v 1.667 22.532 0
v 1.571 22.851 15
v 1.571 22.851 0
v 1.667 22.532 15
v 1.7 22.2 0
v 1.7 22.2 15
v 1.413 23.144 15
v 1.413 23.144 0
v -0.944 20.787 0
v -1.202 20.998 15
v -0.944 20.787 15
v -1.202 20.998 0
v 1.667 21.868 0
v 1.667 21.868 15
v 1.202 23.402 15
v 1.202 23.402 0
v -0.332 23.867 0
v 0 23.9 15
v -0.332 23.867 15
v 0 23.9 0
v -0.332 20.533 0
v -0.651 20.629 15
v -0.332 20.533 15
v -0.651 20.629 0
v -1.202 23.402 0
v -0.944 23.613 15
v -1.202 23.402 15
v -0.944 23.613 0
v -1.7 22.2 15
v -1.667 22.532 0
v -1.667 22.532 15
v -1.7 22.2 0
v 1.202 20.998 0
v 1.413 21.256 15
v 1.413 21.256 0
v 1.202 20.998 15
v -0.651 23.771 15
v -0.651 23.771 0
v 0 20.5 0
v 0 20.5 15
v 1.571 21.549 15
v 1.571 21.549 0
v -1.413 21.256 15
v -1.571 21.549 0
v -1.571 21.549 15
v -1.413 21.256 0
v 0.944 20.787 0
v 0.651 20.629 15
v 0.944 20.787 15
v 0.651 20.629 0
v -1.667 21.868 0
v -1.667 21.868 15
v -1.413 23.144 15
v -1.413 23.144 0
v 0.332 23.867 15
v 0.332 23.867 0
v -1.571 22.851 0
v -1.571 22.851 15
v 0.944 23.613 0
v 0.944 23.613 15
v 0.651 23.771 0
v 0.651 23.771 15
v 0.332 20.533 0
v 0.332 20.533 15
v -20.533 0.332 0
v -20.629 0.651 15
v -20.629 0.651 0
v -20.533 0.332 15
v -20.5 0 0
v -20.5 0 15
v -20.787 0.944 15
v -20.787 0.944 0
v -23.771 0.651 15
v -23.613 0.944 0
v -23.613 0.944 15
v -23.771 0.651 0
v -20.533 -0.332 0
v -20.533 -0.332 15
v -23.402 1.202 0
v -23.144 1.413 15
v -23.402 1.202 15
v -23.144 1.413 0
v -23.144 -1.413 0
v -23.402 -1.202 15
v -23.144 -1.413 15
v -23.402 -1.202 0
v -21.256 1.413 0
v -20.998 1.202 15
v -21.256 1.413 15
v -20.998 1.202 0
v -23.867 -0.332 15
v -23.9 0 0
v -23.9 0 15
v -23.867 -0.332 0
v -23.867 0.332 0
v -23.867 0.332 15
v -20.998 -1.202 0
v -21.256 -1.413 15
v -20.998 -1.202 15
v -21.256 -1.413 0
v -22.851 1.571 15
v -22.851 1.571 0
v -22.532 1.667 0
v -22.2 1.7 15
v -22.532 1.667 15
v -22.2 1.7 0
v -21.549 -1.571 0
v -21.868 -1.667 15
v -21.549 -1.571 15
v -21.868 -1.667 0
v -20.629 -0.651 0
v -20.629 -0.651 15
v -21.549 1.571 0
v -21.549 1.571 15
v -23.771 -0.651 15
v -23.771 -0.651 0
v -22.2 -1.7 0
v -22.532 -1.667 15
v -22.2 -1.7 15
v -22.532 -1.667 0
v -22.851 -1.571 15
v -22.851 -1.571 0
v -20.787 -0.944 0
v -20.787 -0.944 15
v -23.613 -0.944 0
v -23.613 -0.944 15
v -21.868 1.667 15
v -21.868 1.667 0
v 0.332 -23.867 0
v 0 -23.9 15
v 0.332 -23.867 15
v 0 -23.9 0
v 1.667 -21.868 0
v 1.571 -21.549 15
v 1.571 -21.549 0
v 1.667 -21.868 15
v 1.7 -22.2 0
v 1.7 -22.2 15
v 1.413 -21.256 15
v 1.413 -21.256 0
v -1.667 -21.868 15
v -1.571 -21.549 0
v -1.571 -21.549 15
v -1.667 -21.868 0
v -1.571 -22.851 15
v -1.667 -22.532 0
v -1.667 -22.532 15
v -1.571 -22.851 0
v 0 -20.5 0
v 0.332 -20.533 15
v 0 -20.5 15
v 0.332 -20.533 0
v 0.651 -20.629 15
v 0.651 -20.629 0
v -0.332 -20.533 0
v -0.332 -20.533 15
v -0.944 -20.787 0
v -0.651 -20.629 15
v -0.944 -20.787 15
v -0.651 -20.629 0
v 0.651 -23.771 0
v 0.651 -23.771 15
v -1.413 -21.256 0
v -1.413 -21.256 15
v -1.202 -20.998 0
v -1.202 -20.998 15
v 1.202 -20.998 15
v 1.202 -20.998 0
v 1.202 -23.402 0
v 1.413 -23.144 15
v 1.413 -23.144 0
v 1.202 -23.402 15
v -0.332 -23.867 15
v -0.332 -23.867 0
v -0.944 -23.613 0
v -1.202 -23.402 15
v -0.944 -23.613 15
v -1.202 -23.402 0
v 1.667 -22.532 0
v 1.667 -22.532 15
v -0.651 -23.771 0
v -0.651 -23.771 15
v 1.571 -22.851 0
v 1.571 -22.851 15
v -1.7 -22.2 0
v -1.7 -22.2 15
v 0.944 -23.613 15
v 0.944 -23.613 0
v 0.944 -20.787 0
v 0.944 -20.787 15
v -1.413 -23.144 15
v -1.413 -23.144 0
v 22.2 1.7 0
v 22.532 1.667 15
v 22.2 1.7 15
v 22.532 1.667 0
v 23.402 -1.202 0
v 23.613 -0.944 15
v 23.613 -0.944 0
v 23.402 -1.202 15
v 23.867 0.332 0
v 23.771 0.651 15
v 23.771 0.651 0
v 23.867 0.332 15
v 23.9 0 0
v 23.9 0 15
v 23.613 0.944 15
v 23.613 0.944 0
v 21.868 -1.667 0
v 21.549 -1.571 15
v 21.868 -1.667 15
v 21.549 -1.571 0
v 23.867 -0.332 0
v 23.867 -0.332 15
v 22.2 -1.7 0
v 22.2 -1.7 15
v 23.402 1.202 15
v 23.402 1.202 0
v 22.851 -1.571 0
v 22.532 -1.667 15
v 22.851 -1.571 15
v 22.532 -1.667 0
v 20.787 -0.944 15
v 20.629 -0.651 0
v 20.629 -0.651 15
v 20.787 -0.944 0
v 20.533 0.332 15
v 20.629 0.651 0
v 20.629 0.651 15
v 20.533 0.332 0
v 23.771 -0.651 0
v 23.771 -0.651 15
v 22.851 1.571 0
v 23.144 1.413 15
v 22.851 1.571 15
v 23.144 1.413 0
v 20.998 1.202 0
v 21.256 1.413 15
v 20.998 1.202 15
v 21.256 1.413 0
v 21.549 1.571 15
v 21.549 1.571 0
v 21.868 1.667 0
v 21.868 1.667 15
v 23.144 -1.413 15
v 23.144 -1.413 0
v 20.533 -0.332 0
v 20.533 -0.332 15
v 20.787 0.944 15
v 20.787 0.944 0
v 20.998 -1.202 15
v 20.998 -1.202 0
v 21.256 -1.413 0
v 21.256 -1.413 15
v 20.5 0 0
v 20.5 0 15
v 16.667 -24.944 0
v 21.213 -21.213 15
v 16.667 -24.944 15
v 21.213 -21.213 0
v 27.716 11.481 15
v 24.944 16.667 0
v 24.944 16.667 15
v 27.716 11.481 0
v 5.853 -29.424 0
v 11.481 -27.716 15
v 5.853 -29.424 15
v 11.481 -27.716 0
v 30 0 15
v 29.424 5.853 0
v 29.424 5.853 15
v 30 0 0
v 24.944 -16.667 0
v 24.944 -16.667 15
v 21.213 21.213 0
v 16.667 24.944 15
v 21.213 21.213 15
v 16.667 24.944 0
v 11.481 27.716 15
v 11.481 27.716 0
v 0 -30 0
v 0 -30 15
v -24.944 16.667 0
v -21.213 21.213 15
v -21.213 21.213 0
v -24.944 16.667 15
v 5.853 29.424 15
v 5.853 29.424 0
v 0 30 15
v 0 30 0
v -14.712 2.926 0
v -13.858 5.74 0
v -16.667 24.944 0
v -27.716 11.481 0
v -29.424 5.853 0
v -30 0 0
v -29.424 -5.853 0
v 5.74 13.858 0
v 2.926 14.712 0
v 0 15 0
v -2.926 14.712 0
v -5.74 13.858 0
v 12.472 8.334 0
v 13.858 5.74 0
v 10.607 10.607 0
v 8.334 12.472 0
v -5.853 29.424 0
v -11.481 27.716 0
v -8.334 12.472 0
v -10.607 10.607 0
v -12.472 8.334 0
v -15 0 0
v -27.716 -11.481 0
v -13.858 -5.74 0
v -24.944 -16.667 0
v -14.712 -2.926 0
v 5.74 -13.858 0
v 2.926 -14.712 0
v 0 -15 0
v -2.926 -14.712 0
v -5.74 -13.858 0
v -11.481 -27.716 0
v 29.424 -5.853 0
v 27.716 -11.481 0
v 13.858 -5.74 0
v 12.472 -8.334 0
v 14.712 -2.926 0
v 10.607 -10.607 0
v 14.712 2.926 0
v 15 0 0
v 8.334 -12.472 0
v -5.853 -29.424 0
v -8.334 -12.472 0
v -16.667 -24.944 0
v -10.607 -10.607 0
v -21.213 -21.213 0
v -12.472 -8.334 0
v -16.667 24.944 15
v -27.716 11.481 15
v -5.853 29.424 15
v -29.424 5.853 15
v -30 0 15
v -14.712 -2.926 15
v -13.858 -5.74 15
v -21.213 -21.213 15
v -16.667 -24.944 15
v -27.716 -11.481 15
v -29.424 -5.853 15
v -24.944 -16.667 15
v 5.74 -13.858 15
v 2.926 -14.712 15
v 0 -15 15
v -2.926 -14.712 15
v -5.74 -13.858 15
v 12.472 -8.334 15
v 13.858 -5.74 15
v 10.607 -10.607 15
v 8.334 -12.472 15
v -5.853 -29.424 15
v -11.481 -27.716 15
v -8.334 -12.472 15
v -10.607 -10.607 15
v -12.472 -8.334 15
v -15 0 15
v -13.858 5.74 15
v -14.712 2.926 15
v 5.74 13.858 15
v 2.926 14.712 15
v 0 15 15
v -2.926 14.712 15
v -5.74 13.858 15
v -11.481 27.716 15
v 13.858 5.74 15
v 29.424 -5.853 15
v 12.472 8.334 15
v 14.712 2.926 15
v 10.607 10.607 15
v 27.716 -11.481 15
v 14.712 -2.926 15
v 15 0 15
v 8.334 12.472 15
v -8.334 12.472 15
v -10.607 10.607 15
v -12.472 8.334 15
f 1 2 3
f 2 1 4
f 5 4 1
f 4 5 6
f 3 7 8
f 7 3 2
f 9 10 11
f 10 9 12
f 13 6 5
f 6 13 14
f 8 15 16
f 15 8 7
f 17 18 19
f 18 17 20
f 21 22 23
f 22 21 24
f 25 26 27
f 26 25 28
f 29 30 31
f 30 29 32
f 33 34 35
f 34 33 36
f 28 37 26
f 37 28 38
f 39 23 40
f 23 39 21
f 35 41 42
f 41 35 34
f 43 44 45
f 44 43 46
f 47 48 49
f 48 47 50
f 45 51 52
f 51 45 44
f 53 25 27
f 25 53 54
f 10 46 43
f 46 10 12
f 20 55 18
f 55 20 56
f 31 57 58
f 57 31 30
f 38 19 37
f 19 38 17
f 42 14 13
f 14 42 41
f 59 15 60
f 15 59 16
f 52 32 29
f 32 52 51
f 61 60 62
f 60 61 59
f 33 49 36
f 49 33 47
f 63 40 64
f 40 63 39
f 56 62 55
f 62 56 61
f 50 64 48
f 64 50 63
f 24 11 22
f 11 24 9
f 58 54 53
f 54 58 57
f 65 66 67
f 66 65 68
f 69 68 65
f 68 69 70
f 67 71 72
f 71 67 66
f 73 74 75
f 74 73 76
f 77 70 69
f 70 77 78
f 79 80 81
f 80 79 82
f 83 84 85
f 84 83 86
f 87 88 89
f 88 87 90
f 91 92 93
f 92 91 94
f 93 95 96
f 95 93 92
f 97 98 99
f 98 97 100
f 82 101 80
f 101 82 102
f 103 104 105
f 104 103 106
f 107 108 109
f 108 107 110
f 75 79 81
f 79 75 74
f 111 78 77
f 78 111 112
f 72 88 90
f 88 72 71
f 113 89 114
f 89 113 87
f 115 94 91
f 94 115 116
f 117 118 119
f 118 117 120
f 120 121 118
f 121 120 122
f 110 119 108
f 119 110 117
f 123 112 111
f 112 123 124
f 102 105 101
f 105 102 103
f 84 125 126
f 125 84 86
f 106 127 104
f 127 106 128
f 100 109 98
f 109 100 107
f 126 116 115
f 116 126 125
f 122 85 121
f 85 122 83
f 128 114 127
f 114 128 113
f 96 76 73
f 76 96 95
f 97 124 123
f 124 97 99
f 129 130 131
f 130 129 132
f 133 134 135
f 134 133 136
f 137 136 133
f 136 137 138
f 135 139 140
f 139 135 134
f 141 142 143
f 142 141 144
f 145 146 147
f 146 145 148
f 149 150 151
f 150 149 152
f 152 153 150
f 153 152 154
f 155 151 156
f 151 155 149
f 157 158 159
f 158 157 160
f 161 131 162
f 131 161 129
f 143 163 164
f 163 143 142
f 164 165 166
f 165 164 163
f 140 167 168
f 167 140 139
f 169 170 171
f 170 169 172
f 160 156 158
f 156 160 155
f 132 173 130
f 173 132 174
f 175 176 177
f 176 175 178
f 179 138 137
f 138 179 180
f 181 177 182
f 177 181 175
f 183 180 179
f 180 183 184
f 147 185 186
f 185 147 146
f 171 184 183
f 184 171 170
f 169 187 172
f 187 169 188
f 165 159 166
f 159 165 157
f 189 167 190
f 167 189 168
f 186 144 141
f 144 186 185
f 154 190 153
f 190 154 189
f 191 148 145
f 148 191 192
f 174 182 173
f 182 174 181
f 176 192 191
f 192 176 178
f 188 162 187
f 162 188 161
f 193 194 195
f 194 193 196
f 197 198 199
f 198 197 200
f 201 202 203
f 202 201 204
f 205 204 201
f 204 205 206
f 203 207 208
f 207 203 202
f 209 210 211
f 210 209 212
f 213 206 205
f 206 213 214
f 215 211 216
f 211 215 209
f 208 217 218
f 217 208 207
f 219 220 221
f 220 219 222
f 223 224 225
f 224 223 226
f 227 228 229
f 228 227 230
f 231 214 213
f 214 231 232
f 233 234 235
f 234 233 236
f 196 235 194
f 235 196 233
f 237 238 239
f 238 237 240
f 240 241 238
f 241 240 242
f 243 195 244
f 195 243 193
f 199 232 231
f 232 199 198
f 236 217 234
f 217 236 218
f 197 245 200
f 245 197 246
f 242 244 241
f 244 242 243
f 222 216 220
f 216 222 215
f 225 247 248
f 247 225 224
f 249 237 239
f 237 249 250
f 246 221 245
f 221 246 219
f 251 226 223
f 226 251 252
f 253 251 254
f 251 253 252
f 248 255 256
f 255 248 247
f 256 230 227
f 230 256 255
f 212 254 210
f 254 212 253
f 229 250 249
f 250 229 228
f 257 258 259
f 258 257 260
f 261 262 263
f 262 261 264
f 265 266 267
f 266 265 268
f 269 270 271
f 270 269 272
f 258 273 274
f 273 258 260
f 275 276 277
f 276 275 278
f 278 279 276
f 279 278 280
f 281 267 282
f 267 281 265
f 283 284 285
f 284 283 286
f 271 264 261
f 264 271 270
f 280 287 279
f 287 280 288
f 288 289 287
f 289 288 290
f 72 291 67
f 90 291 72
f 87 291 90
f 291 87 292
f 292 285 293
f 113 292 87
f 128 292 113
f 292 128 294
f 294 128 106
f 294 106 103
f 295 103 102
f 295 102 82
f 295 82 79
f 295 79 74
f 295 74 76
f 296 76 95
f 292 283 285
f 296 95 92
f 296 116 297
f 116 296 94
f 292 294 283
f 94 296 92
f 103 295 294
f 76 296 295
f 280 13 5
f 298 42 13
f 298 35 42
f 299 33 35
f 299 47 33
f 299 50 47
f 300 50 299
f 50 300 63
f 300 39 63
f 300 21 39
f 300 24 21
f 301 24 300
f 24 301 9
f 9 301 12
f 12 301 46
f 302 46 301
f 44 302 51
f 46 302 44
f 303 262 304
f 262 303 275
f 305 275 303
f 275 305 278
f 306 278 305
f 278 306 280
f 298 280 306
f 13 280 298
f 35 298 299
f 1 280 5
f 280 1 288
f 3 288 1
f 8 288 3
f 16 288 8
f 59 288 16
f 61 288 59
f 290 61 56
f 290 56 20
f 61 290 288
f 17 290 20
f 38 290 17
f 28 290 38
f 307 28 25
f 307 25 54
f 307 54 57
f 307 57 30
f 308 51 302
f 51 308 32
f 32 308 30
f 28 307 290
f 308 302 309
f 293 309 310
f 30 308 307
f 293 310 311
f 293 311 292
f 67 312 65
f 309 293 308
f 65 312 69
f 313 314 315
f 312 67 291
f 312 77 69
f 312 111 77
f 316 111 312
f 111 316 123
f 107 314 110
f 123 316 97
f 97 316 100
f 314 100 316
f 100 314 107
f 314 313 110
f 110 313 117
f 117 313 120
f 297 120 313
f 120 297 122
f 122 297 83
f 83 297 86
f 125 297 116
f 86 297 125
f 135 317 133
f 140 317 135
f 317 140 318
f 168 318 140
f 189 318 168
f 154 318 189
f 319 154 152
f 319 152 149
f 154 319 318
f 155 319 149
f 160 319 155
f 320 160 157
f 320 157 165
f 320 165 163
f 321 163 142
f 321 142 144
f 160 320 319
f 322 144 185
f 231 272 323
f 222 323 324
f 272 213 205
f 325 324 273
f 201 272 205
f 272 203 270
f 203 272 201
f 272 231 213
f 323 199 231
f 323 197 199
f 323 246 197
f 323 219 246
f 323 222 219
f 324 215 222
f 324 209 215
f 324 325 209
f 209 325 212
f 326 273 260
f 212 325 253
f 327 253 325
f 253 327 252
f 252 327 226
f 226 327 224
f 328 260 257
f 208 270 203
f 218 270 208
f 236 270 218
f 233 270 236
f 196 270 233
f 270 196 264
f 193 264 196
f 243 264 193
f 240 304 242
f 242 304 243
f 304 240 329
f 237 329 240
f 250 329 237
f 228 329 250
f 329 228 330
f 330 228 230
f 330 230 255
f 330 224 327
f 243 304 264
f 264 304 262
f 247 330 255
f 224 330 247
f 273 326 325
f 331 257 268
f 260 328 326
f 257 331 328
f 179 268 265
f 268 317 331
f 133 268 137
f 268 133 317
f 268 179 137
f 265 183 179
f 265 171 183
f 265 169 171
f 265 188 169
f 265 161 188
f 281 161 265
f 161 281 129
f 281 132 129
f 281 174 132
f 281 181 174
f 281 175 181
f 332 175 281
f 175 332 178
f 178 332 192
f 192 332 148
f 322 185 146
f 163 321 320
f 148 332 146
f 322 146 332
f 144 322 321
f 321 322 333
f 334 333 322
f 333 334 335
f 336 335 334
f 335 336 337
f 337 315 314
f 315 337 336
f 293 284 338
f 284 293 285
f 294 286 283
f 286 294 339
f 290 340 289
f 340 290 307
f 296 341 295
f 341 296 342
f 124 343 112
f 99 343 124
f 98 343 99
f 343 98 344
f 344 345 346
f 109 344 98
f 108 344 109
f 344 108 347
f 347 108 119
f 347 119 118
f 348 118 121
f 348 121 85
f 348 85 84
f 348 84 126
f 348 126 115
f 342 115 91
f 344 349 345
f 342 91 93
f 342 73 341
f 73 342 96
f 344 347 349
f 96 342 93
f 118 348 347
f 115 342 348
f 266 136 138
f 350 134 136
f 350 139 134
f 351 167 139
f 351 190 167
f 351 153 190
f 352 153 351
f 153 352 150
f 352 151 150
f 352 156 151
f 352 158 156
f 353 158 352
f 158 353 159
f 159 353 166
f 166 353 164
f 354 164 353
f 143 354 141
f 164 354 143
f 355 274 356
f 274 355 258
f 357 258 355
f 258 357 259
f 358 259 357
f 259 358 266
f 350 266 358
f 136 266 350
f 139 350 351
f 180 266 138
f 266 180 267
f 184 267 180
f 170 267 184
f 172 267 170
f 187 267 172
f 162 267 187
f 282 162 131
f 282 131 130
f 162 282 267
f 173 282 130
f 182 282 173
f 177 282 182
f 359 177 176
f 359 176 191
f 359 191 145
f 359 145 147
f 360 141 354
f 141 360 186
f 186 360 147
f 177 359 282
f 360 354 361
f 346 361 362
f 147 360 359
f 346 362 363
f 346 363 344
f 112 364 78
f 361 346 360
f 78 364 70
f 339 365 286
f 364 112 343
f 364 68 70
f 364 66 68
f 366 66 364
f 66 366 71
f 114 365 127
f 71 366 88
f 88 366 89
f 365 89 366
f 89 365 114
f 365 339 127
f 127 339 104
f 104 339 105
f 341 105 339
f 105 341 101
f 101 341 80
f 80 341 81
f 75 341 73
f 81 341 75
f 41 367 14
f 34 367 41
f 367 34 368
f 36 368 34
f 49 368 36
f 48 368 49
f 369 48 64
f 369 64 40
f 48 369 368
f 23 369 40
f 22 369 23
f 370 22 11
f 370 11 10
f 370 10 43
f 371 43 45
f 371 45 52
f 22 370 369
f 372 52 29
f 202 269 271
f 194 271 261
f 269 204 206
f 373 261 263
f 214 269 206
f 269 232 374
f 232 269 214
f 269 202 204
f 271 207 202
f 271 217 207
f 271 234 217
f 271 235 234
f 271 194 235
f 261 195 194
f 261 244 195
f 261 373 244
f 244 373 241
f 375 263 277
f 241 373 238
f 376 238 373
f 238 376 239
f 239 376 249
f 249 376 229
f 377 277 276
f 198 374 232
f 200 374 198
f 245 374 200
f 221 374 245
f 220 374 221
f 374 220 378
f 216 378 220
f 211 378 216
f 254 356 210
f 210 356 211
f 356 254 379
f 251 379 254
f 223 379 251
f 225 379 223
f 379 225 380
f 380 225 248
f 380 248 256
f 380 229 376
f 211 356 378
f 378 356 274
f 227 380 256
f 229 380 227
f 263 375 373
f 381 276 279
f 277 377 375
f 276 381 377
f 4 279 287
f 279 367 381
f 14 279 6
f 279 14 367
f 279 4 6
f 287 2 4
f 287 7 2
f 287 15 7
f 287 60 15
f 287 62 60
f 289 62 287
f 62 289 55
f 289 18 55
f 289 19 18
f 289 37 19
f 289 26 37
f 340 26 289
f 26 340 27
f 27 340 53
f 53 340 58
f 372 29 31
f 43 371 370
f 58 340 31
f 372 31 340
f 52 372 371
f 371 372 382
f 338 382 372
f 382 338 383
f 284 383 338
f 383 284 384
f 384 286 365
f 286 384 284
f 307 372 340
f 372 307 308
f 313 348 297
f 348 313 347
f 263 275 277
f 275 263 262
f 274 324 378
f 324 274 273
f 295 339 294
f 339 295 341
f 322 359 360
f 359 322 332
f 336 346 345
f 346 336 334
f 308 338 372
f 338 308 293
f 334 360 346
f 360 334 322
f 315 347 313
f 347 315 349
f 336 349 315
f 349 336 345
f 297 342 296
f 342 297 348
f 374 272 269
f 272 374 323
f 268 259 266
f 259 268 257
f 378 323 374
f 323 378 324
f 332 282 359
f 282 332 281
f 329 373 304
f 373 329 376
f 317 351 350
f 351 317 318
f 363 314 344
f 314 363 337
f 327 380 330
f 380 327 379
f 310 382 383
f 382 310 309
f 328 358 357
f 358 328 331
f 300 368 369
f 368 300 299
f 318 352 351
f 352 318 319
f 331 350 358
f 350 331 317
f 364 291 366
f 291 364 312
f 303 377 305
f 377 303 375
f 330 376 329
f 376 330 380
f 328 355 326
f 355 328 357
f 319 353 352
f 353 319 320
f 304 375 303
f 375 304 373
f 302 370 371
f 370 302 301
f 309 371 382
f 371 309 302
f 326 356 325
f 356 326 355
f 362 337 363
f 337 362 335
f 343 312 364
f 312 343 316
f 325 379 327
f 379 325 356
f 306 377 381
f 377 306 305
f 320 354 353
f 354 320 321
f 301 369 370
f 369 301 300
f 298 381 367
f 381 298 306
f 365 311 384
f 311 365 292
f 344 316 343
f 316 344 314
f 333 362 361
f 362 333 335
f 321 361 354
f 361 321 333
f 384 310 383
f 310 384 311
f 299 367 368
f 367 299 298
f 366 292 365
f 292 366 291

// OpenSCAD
$fn = 32;

// ----------------------------------------------------------------------
// Flange Ø60 x 15
// 4 holes on a Ø44.4 bolt circle, bolted joints
// ----------------------------------------------------------------------

// --- parameters (mm) ---
flange_d = 60;   // outside diameter of the flange
thickness = 15;  // flange thickness
holes = 4;       // number of bolt holes
pcd = 44.4;      // bolt circle diameter
start_deg = 90;  // angle of the first hole, from +X
hole_d = 3.4;    // bolt hole diameter
bore_d = 30;     // central through bore
hub_d = 38;      // hub outside diameter
hub_h = 0;       // hub height above the flange face (0 = no hub)

// --- derived feature positions (mm) ---
height = thickness + hub_h;  // = 15   overall height of the part
pcd_r = pcd / 2;             // = 22.2   bolt circle radius
hole_step = 360 / holes;     // = 90   angular pitch
feature_centers = [
  [pcd_r * cos(start_deg + 0 * hole_step), pcd_r * sin(start_deg + 0 * hole_step)],
  [pcd_r * cos(start_deg + 1 * hole_step), pcd_r * sin(start_deg + 1 * hole_step)],
  [pcd_r * cos(start_deg + 2 * hole_step), pcd_r * sin(start_deg + 2 * hole_step)],
  [pcd_r * cos(start_deg + 3 * hole_step), pcd_r * sin(start_deg + 3 * hole_step)]
];   // bolt hole centres on the pitch circle

// flange disc, every hole and the bore cut straight through
difference() {
  union() {
    cylinder(d = flange_d, h = thickness);
  }
  translate([0, 0, -1]) cylinder(d = bore_d, h = height + 2);  // bore, through
  for (centre = feature_centers)
    translate([centre[0], centre[1], -1]) cylinder(d = hole_d, h = thickness + 2);
}
